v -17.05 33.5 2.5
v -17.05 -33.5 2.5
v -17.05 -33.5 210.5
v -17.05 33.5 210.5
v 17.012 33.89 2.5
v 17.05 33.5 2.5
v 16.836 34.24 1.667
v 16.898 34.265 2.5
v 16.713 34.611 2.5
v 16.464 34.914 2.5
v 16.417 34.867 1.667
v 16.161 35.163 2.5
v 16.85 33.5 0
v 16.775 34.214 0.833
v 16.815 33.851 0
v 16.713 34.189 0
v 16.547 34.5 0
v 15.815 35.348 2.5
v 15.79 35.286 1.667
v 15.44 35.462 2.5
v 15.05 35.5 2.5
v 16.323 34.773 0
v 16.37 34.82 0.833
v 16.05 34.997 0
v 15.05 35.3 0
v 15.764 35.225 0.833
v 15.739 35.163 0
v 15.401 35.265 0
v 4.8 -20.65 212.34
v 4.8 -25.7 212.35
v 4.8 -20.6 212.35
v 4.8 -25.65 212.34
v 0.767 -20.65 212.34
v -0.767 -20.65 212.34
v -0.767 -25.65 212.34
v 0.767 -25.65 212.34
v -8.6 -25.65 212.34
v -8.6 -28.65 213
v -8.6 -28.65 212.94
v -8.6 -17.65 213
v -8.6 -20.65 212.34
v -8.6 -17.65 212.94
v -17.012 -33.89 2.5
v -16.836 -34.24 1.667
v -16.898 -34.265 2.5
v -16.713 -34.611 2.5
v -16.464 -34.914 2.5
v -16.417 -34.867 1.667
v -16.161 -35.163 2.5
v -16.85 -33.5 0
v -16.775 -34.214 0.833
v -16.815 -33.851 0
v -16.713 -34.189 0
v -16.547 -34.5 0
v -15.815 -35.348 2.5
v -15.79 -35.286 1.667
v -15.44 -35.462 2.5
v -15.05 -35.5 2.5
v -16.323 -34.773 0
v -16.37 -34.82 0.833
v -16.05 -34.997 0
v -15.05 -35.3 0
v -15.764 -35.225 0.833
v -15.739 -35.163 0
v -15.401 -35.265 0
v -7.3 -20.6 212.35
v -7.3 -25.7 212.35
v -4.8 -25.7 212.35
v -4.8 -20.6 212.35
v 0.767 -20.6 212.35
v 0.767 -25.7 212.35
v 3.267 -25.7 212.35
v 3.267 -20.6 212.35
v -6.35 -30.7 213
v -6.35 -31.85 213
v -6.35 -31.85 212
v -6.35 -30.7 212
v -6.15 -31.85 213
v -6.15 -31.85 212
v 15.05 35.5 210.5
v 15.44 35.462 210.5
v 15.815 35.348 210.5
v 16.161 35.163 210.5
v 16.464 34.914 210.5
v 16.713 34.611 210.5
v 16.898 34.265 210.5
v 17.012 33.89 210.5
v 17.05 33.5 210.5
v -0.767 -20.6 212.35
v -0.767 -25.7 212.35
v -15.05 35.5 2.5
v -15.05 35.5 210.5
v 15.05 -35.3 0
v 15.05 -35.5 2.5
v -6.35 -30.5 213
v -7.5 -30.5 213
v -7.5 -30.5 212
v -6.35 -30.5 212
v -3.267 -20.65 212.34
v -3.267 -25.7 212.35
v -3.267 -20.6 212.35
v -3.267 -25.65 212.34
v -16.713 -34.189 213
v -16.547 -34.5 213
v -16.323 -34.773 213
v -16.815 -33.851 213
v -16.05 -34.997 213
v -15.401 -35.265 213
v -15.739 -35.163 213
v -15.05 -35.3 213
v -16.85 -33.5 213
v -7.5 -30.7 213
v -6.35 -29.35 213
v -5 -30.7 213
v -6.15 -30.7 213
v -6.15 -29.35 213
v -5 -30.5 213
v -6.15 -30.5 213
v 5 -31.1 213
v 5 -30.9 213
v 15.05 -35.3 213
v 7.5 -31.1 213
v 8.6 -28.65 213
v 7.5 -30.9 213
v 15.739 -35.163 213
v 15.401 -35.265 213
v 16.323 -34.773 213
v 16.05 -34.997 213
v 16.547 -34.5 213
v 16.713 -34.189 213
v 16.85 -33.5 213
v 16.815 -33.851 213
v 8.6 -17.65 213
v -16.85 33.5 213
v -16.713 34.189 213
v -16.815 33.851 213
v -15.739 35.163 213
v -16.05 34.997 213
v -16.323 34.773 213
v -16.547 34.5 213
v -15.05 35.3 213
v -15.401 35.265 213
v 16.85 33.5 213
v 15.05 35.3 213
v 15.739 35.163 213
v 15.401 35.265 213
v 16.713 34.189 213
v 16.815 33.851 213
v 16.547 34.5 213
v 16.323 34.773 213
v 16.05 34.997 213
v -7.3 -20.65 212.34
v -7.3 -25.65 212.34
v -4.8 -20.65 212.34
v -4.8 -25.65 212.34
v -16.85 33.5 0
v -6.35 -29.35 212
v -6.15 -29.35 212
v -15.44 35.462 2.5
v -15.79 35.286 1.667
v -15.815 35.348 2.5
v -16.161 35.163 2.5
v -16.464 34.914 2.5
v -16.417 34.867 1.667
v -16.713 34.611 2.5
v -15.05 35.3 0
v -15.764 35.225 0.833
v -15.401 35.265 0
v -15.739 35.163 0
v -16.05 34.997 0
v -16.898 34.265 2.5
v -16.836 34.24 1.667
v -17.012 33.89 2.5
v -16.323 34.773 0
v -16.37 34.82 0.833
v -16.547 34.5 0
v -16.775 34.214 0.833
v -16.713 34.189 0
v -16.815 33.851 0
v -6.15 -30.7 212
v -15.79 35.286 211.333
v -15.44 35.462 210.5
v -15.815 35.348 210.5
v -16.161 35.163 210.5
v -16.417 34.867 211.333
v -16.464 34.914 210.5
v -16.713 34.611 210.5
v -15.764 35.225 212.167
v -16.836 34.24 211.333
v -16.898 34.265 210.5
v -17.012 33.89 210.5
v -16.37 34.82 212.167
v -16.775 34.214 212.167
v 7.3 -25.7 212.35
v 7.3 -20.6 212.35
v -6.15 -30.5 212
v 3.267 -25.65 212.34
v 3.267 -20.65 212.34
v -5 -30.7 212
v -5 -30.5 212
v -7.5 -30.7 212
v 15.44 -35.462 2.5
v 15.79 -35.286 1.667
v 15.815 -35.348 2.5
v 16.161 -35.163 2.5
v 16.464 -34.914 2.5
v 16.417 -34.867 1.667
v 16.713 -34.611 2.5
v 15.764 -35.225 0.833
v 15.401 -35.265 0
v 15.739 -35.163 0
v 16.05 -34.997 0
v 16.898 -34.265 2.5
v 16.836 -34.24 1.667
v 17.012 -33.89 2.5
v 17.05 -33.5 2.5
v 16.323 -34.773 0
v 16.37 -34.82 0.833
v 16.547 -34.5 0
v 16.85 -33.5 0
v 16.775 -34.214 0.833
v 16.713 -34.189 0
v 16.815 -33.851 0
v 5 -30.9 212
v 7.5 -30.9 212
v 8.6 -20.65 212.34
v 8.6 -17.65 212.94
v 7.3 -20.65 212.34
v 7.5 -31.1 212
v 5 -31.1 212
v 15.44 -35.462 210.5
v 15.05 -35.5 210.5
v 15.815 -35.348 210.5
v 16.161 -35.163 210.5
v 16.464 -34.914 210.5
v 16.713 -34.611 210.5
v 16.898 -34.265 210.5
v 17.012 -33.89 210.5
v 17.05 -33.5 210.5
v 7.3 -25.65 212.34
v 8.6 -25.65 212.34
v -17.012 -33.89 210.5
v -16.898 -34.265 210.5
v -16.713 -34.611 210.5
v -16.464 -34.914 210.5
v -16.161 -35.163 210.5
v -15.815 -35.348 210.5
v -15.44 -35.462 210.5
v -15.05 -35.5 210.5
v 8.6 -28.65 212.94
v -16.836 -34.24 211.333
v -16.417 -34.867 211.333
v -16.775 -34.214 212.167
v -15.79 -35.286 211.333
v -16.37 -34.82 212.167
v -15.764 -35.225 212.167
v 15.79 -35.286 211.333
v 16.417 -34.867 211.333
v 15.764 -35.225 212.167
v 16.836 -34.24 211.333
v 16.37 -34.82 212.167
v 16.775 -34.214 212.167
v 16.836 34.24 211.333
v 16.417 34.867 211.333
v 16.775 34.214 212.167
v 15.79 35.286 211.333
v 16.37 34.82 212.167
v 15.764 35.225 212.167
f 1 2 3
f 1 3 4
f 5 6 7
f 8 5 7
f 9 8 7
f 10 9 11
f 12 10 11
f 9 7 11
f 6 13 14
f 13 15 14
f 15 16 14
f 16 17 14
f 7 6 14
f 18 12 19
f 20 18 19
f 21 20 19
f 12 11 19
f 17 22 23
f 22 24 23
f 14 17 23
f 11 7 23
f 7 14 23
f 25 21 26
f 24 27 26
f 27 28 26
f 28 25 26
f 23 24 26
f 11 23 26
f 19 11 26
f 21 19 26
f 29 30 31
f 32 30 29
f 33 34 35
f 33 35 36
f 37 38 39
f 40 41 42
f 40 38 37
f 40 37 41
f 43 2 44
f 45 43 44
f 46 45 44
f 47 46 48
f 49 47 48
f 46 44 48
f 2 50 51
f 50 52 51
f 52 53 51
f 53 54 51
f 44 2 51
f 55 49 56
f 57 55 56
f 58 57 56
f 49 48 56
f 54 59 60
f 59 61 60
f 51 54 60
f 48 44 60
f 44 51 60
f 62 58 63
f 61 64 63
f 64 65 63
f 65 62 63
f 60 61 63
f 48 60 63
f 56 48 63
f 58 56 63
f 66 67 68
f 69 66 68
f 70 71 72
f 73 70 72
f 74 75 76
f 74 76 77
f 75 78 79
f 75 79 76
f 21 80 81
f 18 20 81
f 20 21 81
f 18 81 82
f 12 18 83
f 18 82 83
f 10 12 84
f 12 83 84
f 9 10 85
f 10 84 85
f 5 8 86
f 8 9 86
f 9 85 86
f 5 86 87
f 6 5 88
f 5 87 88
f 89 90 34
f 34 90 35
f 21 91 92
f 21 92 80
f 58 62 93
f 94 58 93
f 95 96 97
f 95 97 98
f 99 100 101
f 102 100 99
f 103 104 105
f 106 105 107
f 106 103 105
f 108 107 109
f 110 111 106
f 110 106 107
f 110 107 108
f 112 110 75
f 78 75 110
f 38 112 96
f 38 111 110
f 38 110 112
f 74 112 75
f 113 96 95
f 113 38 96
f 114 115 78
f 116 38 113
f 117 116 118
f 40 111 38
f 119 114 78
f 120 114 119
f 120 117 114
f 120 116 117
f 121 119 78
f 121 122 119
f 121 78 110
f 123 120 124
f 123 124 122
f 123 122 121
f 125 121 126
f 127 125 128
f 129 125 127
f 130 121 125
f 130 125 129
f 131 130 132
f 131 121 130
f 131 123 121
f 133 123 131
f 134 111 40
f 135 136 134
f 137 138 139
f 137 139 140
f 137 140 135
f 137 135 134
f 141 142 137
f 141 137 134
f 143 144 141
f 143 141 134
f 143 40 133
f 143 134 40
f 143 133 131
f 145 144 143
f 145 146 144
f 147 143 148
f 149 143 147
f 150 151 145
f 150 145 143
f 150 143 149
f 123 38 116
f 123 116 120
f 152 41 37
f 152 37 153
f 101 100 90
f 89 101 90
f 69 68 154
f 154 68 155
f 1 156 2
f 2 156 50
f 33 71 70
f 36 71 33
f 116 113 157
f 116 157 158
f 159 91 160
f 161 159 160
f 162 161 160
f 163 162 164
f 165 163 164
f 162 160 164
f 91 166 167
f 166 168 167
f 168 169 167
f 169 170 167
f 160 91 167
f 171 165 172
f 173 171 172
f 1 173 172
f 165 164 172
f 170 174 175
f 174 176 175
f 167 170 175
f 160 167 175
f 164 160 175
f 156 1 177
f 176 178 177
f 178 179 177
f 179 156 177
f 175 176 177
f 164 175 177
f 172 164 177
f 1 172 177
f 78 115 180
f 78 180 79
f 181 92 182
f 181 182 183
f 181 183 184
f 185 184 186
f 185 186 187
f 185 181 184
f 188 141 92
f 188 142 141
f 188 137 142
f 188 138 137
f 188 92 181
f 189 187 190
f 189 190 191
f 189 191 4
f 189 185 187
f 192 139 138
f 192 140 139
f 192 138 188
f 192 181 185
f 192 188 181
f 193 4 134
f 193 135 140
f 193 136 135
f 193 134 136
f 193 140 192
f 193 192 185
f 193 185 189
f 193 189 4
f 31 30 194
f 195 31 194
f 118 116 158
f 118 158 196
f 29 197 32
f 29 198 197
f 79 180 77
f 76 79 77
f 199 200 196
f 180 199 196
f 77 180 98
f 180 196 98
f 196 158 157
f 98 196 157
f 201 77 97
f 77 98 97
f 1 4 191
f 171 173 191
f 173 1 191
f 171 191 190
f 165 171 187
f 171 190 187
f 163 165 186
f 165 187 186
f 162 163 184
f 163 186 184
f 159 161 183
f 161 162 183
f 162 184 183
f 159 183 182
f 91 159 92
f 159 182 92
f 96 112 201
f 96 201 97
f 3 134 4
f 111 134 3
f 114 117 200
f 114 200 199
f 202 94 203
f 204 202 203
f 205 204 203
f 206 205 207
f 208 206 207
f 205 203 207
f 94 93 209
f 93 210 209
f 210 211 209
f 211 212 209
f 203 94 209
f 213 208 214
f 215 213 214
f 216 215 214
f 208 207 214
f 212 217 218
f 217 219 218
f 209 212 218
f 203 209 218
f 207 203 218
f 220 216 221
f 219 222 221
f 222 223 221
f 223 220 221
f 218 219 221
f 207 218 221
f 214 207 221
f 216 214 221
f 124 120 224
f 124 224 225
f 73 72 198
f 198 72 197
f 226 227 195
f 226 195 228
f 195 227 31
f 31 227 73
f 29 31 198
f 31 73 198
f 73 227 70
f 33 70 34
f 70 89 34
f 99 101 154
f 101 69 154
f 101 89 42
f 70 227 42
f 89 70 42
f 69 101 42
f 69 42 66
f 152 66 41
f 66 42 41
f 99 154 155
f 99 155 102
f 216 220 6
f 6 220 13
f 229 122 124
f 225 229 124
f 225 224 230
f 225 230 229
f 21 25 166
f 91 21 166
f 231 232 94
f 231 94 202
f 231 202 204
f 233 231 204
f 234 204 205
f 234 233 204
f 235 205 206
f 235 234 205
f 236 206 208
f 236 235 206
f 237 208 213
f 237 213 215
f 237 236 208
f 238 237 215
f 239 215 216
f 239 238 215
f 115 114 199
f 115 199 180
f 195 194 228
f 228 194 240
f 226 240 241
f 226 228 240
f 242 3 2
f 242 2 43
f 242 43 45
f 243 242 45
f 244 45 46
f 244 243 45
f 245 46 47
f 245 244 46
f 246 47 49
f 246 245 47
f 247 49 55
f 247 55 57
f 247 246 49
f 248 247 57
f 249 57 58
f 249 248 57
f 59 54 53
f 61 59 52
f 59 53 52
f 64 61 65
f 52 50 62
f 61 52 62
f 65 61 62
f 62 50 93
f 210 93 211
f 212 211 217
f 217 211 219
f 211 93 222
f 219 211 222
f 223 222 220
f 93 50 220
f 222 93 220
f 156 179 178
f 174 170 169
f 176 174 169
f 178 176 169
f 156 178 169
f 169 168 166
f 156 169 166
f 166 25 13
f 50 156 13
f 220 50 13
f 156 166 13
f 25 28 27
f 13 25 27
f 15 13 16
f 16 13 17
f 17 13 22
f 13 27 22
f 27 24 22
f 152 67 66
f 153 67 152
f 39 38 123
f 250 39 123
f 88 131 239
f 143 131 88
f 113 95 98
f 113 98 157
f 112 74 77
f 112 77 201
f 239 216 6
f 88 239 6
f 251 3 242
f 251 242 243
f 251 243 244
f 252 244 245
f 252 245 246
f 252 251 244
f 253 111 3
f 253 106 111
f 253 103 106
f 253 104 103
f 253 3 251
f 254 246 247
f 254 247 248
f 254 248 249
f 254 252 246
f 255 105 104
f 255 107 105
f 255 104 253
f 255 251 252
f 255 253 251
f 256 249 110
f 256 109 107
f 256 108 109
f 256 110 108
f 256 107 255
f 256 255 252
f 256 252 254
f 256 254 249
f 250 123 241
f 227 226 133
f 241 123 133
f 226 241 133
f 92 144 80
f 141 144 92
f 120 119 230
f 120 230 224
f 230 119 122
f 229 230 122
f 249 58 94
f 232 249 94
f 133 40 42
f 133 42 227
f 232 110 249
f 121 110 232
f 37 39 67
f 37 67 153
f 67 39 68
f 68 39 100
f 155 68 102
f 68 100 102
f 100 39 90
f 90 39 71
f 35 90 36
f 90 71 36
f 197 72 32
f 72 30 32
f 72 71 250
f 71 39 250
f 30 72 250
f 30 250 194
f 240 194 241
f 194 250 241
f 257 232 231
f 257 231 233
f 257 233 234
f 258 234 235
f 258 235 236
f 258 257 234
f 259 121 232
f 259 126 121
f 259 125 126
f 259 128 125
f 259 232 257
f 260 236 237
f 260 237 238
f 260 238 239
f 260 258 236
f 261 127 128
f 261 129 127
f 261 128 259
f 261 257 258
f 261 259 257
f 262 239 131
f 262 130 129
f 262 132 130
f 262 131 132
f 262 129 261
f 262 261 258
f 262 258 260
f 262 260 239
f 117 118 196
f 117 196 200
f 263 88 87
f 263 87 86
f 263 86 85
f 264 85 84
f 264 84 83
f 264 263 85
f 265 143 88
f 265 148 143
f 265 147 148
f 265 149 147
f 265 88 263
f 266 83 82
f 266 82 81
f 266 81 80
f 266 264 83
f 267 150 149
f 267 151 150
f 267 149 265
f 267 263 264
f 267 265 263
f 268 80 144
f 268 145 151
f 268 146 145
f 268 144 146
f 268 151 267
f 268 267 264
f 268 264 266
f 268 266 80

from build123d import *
from OCP.BRepFilletAPI import BRepFilletAPI_MakeChamfer

# Parameters (mm, degrees)
ESQUISSE1_W             = 34.1
ESQUISSE1_H             = 71
EXTRUSION1_DEPTH        = 213
ESQUISSE2_W             = 14.6
ESQUISSE2_H             = 6
ENL_V_MAT_EXTRU_1_DEPTH = 0.65
SKETCH1_W               = 2.5
SKETCH1_H               = 0.2
CUT_EXTRUDE1_DEPTH      = 1
SKETCH2_W               = 17.2
SKETCH2_H               = 11
SKETCH2_W_2             = 14.6
SKETCH2_H_2             = 6
SKETCH2_W_3             = 1.53333333
CUT_EXTRUDE2_DEPTH      = 0.66
CHAMFER1_SIZE           = 0.6
CHAMFER1_SIZE_2         = 3
FILLET1_R               = 2
CHAMFER2_SIZE           = 2.5
CHAMFER2_SIZE2          = 0.2
CHAMFER3_SIZE           = 2.5
CHAMFER3_SIZE2          = 0.2


with BuildPart() as part:
    # Esquisse1 → Extrusion1 (new body)
    with BuildSketch(Plane.XY):
        Rectangle(ESQUISSE1_W, ESQUISSE1_H)
    extrude(amount=EXTRUSION1_DEPTH)

    # Esquisse2 → Enlèv. mat.-Extru.1 (cut)
    with BuildSketch(Plane.XY.offset(213)):
        with Locations((0, -23.15)):
            Rectangle(ESQUISSE2_W, ESQUISSE2_H)
    extrude(amount=-ENL_V_MAT_EXTRU_1_DEPTH, mode=Mode.SUBTRACT)

    # Sketch1 → Cut-Extrude1 (cut)
    with BuildSketch(Plane.XY.offset(213)):
        Polygon((-6.35, -29.35), (-6.15, -29.35), (-6.15, -30.5), (-5, -30.5), (-5, -30.7), (-6.15, -30.7), (-6.15, -31.85), (-6.35, -31.85), (-6.35, -30.7), (-7.5, -30.7), (-7.5, -30.5), (-6.35, -30.5), align=None)
        with Locations((6.25, -31)):
            Rectangle(SKETCH1_W, SKETCH1_H)
    extrude(amount=-CUT_EXTRUDE1_DEPTH, mode=Mode.SUBTRACT)

    # Sketch2 → Cut-Extrude2 (cut)
    # profile 1 of 4: a face of its own
    with BuildSketch(Plane.XY.offset(213)):
        with Locations((0, -23.15)):
            Rectangle(SKETCH2_W, SKETCH2_H)
        with Locations((0, -23.15)):
            Rectangle(SKETCH2_W_2, SKETCH2_H_2, mode=Mode.SUBTRACT)
    # profile 2 of 4: a face of its own
    with BuildSketch(Plane.XY.offset(213)):
        with Locations((-4.033333335, -23.15)):
            Rectangle(SKETCH2_W_3, SKETCH2_H_2)
    # profile 3 of 4: a face of its own
    with BuildSketch(Plane.XY.offset(213)):
        with Locations((-5e-09, -23.15)):
            Rectangle(SKETCH2_W_3, SKETCH2_H_2)
    # profile 4 of 4: a face of its own
    with BuildSketch(Plane.XY.offset(213)):
        with Locations((4.033333325, -23.15)):
            Rectangle(SKETCH2_W_3, SKETCH2_H_2)
    extrude(amount=-CUT_EXTRUDE2_DEPTH, mode=Mode.SUBTRACT)

    # Chamfer1
    # the kernel refuses this chamfer: 3, 0.6 mm, written as the material it adds along each edge
    with BuildSketch(Plane(origin=(-16.394396259, -17.65, 212.34), x_dir=(0, 0.18544098588999497, 0.9826554028509418), z_dir=(1, 0, 0)), Plane(origin=(16.394396259, -28.65, 212.34), x_dir=(0, -0.18544098588999497, 0.9826554028509418), z_dir=(-1, 0, 0))) as chamfer1_piece_1:
        Polygon((CHAMFER1_SIZE * 0.982655402851, CHAMFER1_SIZE * 0.18544098589), (-CHAMFER1_SIZE_2 * 0.18544098589, CHAMFER1_SIZE_2 * 0.982655402851), (0, 0), align=None)
    extrude(amount=32.788792518)

    # Fillet1
    fillet1_edges = [part.edges().sort_by_distance(p)[0] for p in [
        (-17.05, 35.5, 106.5),
        (17.05, 35.5, 106.5),
        (17.05, -35.5, 106.5),
        (-17.05, -35.5, 106.5),
    ]]
    fillet(fillet1_edges, radius=FILLET1_R)

    # Chamfer2: one chamfer whose edges measure the first distance from different faces: ONE call of the kernel's chamfer builder (chamfer() names one face for all edges)
    chamfer2_edges_1 = [part.edges().sort_by_distance(p)[0] for p in [
        (0, -35.5, 213),
    ]]
    chamfer2_side_1 = [part.faces().sort_by_distance(p)[0] for p in [
        (0, -35.5, 106.5),
    ]]
    chamfer2_edges_2 = [part.edges().sort_by_distance(p)[0] for p in [
        (-17.05, 0, 213),
    ]]
    chamfer2_side_2 = [part.faces().sort_by_distance(p)[0] for p in [
        (-17.05, 0, 106.5),
    ]]
    chamfer2_edges_3 = [part.edges().sort_by_distance(p)[0] for p in [
        (17.05, 0, 213),
    ]]
    chamfer2_side_3 = [part.faces().sort_by_distance(p)[0] for p in [
        (17.05, 0, 106.5),
    ]]
    chamfer2_edges_4 = [part.edges().sort_by_distance(p)[0] for p in [
        (0, 35.5, 213),
    ]]
    chamfer2_side_4 = [part.faces().sort_by_distance(p)[0] for p in [
        (0, 35.5, 106.5),
    ]]
    chamfer2_edges_5 = [part.edges().sort_by_distance(p)[0] for p in [
        (-16.464213562, 34.914213562, 213),
    ]]
    chamfer2_side_5 = [part.faces().sort_by_distance(p)[0] for p in [
        (-16.464213562, 34.914213562, 106.5),
    ]]
    chamfer2_edges_6 = [part.edges().sort_by_distance(p)[0] for p in [
        (16.464213562, 34.914213562, 213),
    ]]
    chamfer2_side_6 = [part.faces().sort_by_distance(p)[0] for p in [
        (16.464213562, 34.914213562, 106.5),
    ]]
    chamfer2_edges_7 = [part.edges().sort_by_distance(p)[0] for p in [
        (16.464213562, -34.914213562, 213),
    ]]
    chamfer2_side_7 = [part.faces().sort_by_distance(p)[0] for p in [
        (16.464213562, -34.914213562, 106.5),
    ]]
    chamfer2_edges_8 = [part.edges().sort_by_distance(p)[0] for p in [
        (-16.464213562, -34.914213562, 213),
    ]]
    chamfer2_side_8 = [part.faces().sort_by_distance(p)[0] for p in [
        (-16.464213562, -34.914213562, 106.5),
    ]]
    chamfer2 = BRepFilletAPI_MakeChamfer(part.part.solid().wrapped)
    for e in chamfer2_edges_1:
        chamfer2.Add(CHAMFER2_SIZE, CHAMFER2_SIZE2, e.wrapped, chamfer2_side_1[0].wrapped)  # the first distance lies on this face
    for e in chamfer2_edges_2:
        chamfer2.Add(CHAMFER2_SIZE, CHAMFER2_SIZE2, e.wrapped, chamfer2_side_2[0].wrapped)  # the first distance lies on this face
    for e in chamfer2_edges_3:
        chamfer2.Add(CHAMFER2_SIZE, CHAMFER2_SIZE2, e.wrapped, chamfer2_side_3[0].wrapped)  # the first distance lies on this face
    for e in chamfer2_edges_4:
        chamfer2.Add(CHAMFER2_SIZE, CHAMFER2_SIZE2, e.wrapped, chamfer2_side_4[0].wrapped)  # the first distance lies on this face
    for e in chamfer2_edges_5:
        chamfer2.Add(CHAMFER2_SIZE, CHAMFER2_SIZE2, e.wrapped, chamfer2_side_5[0].wrapped)  # the first distance lies on this face
    for e in chamfer2_edges_6:
        chamfer2.Add(CHAMFER2_SIZE, CHAMFER2_SIZE2, e.wrapped, chamfer2_side_6[0].wrapped)  # the first distance lies on this face
    for e in chamfer2_edges_7:
        chamfer2.Add(CHAMFER2_SIZE, CHAMFER2_SIZE2, e.wrapped, chamfer2_side_7[0].wrapped)  # the first distance lies on this face
    for e in chamfer2_edges_8:
        chamfer2.Add(CHAMFER2_SIZE, CHAMFER2_SIZE2, e.wrapped, chamfer2_side_8[0].wrapped)  # the first distance lies on this face
    add(Compound.cast(chamfer2.Shape()), mode=Mode.REPLACE)

    # Chamfer3: one chamfer whose edges measure the first distance from different faces: ONE call of the kernel's chamfer builder (chamfer() names one face for all edges)
    chamfer3_edges_1 = [part.edges().sort_by_distance(p)[0] for p in [
        (0, -35.5, 0),
    ]]
    chamfer3_side_1 = [part.faces().sort_by_distance(p)[0] for p in [
        (0, -35.5, 105.25),
    ]]
    chamfer3_edges_2 = [part.edges().sort_by_distance(p)[0] for p in [
        (-17.05, 0, 0),
    ]]
    chamfer3_side_2 = [part.faces().sort_by_distance(p)[0] for p in [
        (-17.05, 0, 105.25),
    ]]
    chamfer3_edges_3 = [part.edges().sort_by_distance(p)[0] for p in [
        (0, 35.5, 0),
    ]]
    chamfer3_side_3 = [part.faces().sort_by_distance(p)[0] for p in [
        (0, 35.5, 105.25),
    ]]
    chamfer3_edges_4 = [part.edges().sort_by_distance(p)[0] for p in [
        (17.05, 0, 0),
    ]]
    chamfer3_side_4 = [part.faces().sort_by_distance(p)[0] for p in [
        (17.05, 0, 105.25),
    ]]
    chamfer3_edges_5 = [part.edges().sort_by_distance(p)[0] for p in [
        (-16.464213562, 34.914213562, 0),
    ]]
    chamfer3_side_5 = [part.faces().sort_by_distance(p)[0] for p in [
        (-16.464213562, 34.914213562, 105.25),
    ]]
    chamfer3_edges_6 = [part.edges().sort_by_distance(p)[0] for p in [
        (16.464213562, 34.914213562, 0),
    ]]
    chamfer3_side_6 = [part.faces().sort_by_distance(p)[0] for p in [
        (16.464213562, 34.914213562, 105.25),
    ]]
    chamfer3_edges_7 = [part.edges().sort_by_distance(p)[0] for p in [
        (16.464213562, -34.914213562, 0),
    ]]
    chamfer3_side_7 = [part.faces().sort_by_distance(p)[0] for p in [
        (16.464213562, -34.914213562, 105.25),
    ]]
    chamfer3_edges_8 = [part.edges().sort_by_distance(p)[0] for p in [
        (-16.464213562, -34.914213562, 0),
    ]]
    chamfer3_side_8 = [part.faces().sort_by_distance(p)[0] for p in [
        (-16.464213562, -34.914213562, 105.25),
    ]]
    chamfer3 = BRepFilletAPI_MakeChamfer(part.part.solid().wrapped)
    for e in chamfer3_edges_1:
        chamfer3.Add(CHAMFER3_SIZE, CHAMFER3_SIZE2, e.wrapped, chamfer3_side_1[0].wrapped)  # the first distance lies on this face
    for e in chamfer3_edges_2:
        chamfer3.Add(CHAMFER3_SIZE, CHAMFER3_SIZE2, e.wrapped, chamfer3_side_2[0].wrapped)  # the first distance lies on this face
    for e in chamfer3_edges_3:
        chamfer3.Add(CHAMFER3_SIZE, CHAMFER3_SIZE2, e.wrapped, chamfer3_side_3[0].wrapped)  # the first distance lies on this face
    for e in chamfer3_edges_4:
        chamfer3.Add(CHAMFER3_SIZE, CHAMFER3_SIZE2, e.wrapped, chamfer3_side_4[0].wrapped)  # the first distance lies on this face
    for e in chamfer3_edges_5:
        chamfer3.Add(CHAMFER3_SIZE, CHAMFER3_SIZE2, e.wrapped, chamfer3_side_5[0].wrapped)  # the first distance lies on this face
    for e in chamfer3_edges_6:
        chamfer3.Add(CHAMFER3_SIZE, CHAMFER3_SIZE2, e.wrapped, chamfer3_side_6[0].wrapped)  # the first distance lies on this face
    for e in chamfer3_edges_7:
        chamfer3.Add(CHAMFER3_SIZE, CHAMFER3_SIZE2, e.wrapped, chamfer3_side_7[0].wrapped)  # the first distance lies on this face
    for e in chamfer3_edges_8:
        chamfer3.Add(CHAMFER3_SIZE, CHAMFER3_SIZE2, e.wrapped, chamfer3_side_8[0].wrapped)  # the first distance lies on this face
    add(Compound.cast(chamfer3.Shape()), mode=Mode.REPLACE)


solid = part.part
